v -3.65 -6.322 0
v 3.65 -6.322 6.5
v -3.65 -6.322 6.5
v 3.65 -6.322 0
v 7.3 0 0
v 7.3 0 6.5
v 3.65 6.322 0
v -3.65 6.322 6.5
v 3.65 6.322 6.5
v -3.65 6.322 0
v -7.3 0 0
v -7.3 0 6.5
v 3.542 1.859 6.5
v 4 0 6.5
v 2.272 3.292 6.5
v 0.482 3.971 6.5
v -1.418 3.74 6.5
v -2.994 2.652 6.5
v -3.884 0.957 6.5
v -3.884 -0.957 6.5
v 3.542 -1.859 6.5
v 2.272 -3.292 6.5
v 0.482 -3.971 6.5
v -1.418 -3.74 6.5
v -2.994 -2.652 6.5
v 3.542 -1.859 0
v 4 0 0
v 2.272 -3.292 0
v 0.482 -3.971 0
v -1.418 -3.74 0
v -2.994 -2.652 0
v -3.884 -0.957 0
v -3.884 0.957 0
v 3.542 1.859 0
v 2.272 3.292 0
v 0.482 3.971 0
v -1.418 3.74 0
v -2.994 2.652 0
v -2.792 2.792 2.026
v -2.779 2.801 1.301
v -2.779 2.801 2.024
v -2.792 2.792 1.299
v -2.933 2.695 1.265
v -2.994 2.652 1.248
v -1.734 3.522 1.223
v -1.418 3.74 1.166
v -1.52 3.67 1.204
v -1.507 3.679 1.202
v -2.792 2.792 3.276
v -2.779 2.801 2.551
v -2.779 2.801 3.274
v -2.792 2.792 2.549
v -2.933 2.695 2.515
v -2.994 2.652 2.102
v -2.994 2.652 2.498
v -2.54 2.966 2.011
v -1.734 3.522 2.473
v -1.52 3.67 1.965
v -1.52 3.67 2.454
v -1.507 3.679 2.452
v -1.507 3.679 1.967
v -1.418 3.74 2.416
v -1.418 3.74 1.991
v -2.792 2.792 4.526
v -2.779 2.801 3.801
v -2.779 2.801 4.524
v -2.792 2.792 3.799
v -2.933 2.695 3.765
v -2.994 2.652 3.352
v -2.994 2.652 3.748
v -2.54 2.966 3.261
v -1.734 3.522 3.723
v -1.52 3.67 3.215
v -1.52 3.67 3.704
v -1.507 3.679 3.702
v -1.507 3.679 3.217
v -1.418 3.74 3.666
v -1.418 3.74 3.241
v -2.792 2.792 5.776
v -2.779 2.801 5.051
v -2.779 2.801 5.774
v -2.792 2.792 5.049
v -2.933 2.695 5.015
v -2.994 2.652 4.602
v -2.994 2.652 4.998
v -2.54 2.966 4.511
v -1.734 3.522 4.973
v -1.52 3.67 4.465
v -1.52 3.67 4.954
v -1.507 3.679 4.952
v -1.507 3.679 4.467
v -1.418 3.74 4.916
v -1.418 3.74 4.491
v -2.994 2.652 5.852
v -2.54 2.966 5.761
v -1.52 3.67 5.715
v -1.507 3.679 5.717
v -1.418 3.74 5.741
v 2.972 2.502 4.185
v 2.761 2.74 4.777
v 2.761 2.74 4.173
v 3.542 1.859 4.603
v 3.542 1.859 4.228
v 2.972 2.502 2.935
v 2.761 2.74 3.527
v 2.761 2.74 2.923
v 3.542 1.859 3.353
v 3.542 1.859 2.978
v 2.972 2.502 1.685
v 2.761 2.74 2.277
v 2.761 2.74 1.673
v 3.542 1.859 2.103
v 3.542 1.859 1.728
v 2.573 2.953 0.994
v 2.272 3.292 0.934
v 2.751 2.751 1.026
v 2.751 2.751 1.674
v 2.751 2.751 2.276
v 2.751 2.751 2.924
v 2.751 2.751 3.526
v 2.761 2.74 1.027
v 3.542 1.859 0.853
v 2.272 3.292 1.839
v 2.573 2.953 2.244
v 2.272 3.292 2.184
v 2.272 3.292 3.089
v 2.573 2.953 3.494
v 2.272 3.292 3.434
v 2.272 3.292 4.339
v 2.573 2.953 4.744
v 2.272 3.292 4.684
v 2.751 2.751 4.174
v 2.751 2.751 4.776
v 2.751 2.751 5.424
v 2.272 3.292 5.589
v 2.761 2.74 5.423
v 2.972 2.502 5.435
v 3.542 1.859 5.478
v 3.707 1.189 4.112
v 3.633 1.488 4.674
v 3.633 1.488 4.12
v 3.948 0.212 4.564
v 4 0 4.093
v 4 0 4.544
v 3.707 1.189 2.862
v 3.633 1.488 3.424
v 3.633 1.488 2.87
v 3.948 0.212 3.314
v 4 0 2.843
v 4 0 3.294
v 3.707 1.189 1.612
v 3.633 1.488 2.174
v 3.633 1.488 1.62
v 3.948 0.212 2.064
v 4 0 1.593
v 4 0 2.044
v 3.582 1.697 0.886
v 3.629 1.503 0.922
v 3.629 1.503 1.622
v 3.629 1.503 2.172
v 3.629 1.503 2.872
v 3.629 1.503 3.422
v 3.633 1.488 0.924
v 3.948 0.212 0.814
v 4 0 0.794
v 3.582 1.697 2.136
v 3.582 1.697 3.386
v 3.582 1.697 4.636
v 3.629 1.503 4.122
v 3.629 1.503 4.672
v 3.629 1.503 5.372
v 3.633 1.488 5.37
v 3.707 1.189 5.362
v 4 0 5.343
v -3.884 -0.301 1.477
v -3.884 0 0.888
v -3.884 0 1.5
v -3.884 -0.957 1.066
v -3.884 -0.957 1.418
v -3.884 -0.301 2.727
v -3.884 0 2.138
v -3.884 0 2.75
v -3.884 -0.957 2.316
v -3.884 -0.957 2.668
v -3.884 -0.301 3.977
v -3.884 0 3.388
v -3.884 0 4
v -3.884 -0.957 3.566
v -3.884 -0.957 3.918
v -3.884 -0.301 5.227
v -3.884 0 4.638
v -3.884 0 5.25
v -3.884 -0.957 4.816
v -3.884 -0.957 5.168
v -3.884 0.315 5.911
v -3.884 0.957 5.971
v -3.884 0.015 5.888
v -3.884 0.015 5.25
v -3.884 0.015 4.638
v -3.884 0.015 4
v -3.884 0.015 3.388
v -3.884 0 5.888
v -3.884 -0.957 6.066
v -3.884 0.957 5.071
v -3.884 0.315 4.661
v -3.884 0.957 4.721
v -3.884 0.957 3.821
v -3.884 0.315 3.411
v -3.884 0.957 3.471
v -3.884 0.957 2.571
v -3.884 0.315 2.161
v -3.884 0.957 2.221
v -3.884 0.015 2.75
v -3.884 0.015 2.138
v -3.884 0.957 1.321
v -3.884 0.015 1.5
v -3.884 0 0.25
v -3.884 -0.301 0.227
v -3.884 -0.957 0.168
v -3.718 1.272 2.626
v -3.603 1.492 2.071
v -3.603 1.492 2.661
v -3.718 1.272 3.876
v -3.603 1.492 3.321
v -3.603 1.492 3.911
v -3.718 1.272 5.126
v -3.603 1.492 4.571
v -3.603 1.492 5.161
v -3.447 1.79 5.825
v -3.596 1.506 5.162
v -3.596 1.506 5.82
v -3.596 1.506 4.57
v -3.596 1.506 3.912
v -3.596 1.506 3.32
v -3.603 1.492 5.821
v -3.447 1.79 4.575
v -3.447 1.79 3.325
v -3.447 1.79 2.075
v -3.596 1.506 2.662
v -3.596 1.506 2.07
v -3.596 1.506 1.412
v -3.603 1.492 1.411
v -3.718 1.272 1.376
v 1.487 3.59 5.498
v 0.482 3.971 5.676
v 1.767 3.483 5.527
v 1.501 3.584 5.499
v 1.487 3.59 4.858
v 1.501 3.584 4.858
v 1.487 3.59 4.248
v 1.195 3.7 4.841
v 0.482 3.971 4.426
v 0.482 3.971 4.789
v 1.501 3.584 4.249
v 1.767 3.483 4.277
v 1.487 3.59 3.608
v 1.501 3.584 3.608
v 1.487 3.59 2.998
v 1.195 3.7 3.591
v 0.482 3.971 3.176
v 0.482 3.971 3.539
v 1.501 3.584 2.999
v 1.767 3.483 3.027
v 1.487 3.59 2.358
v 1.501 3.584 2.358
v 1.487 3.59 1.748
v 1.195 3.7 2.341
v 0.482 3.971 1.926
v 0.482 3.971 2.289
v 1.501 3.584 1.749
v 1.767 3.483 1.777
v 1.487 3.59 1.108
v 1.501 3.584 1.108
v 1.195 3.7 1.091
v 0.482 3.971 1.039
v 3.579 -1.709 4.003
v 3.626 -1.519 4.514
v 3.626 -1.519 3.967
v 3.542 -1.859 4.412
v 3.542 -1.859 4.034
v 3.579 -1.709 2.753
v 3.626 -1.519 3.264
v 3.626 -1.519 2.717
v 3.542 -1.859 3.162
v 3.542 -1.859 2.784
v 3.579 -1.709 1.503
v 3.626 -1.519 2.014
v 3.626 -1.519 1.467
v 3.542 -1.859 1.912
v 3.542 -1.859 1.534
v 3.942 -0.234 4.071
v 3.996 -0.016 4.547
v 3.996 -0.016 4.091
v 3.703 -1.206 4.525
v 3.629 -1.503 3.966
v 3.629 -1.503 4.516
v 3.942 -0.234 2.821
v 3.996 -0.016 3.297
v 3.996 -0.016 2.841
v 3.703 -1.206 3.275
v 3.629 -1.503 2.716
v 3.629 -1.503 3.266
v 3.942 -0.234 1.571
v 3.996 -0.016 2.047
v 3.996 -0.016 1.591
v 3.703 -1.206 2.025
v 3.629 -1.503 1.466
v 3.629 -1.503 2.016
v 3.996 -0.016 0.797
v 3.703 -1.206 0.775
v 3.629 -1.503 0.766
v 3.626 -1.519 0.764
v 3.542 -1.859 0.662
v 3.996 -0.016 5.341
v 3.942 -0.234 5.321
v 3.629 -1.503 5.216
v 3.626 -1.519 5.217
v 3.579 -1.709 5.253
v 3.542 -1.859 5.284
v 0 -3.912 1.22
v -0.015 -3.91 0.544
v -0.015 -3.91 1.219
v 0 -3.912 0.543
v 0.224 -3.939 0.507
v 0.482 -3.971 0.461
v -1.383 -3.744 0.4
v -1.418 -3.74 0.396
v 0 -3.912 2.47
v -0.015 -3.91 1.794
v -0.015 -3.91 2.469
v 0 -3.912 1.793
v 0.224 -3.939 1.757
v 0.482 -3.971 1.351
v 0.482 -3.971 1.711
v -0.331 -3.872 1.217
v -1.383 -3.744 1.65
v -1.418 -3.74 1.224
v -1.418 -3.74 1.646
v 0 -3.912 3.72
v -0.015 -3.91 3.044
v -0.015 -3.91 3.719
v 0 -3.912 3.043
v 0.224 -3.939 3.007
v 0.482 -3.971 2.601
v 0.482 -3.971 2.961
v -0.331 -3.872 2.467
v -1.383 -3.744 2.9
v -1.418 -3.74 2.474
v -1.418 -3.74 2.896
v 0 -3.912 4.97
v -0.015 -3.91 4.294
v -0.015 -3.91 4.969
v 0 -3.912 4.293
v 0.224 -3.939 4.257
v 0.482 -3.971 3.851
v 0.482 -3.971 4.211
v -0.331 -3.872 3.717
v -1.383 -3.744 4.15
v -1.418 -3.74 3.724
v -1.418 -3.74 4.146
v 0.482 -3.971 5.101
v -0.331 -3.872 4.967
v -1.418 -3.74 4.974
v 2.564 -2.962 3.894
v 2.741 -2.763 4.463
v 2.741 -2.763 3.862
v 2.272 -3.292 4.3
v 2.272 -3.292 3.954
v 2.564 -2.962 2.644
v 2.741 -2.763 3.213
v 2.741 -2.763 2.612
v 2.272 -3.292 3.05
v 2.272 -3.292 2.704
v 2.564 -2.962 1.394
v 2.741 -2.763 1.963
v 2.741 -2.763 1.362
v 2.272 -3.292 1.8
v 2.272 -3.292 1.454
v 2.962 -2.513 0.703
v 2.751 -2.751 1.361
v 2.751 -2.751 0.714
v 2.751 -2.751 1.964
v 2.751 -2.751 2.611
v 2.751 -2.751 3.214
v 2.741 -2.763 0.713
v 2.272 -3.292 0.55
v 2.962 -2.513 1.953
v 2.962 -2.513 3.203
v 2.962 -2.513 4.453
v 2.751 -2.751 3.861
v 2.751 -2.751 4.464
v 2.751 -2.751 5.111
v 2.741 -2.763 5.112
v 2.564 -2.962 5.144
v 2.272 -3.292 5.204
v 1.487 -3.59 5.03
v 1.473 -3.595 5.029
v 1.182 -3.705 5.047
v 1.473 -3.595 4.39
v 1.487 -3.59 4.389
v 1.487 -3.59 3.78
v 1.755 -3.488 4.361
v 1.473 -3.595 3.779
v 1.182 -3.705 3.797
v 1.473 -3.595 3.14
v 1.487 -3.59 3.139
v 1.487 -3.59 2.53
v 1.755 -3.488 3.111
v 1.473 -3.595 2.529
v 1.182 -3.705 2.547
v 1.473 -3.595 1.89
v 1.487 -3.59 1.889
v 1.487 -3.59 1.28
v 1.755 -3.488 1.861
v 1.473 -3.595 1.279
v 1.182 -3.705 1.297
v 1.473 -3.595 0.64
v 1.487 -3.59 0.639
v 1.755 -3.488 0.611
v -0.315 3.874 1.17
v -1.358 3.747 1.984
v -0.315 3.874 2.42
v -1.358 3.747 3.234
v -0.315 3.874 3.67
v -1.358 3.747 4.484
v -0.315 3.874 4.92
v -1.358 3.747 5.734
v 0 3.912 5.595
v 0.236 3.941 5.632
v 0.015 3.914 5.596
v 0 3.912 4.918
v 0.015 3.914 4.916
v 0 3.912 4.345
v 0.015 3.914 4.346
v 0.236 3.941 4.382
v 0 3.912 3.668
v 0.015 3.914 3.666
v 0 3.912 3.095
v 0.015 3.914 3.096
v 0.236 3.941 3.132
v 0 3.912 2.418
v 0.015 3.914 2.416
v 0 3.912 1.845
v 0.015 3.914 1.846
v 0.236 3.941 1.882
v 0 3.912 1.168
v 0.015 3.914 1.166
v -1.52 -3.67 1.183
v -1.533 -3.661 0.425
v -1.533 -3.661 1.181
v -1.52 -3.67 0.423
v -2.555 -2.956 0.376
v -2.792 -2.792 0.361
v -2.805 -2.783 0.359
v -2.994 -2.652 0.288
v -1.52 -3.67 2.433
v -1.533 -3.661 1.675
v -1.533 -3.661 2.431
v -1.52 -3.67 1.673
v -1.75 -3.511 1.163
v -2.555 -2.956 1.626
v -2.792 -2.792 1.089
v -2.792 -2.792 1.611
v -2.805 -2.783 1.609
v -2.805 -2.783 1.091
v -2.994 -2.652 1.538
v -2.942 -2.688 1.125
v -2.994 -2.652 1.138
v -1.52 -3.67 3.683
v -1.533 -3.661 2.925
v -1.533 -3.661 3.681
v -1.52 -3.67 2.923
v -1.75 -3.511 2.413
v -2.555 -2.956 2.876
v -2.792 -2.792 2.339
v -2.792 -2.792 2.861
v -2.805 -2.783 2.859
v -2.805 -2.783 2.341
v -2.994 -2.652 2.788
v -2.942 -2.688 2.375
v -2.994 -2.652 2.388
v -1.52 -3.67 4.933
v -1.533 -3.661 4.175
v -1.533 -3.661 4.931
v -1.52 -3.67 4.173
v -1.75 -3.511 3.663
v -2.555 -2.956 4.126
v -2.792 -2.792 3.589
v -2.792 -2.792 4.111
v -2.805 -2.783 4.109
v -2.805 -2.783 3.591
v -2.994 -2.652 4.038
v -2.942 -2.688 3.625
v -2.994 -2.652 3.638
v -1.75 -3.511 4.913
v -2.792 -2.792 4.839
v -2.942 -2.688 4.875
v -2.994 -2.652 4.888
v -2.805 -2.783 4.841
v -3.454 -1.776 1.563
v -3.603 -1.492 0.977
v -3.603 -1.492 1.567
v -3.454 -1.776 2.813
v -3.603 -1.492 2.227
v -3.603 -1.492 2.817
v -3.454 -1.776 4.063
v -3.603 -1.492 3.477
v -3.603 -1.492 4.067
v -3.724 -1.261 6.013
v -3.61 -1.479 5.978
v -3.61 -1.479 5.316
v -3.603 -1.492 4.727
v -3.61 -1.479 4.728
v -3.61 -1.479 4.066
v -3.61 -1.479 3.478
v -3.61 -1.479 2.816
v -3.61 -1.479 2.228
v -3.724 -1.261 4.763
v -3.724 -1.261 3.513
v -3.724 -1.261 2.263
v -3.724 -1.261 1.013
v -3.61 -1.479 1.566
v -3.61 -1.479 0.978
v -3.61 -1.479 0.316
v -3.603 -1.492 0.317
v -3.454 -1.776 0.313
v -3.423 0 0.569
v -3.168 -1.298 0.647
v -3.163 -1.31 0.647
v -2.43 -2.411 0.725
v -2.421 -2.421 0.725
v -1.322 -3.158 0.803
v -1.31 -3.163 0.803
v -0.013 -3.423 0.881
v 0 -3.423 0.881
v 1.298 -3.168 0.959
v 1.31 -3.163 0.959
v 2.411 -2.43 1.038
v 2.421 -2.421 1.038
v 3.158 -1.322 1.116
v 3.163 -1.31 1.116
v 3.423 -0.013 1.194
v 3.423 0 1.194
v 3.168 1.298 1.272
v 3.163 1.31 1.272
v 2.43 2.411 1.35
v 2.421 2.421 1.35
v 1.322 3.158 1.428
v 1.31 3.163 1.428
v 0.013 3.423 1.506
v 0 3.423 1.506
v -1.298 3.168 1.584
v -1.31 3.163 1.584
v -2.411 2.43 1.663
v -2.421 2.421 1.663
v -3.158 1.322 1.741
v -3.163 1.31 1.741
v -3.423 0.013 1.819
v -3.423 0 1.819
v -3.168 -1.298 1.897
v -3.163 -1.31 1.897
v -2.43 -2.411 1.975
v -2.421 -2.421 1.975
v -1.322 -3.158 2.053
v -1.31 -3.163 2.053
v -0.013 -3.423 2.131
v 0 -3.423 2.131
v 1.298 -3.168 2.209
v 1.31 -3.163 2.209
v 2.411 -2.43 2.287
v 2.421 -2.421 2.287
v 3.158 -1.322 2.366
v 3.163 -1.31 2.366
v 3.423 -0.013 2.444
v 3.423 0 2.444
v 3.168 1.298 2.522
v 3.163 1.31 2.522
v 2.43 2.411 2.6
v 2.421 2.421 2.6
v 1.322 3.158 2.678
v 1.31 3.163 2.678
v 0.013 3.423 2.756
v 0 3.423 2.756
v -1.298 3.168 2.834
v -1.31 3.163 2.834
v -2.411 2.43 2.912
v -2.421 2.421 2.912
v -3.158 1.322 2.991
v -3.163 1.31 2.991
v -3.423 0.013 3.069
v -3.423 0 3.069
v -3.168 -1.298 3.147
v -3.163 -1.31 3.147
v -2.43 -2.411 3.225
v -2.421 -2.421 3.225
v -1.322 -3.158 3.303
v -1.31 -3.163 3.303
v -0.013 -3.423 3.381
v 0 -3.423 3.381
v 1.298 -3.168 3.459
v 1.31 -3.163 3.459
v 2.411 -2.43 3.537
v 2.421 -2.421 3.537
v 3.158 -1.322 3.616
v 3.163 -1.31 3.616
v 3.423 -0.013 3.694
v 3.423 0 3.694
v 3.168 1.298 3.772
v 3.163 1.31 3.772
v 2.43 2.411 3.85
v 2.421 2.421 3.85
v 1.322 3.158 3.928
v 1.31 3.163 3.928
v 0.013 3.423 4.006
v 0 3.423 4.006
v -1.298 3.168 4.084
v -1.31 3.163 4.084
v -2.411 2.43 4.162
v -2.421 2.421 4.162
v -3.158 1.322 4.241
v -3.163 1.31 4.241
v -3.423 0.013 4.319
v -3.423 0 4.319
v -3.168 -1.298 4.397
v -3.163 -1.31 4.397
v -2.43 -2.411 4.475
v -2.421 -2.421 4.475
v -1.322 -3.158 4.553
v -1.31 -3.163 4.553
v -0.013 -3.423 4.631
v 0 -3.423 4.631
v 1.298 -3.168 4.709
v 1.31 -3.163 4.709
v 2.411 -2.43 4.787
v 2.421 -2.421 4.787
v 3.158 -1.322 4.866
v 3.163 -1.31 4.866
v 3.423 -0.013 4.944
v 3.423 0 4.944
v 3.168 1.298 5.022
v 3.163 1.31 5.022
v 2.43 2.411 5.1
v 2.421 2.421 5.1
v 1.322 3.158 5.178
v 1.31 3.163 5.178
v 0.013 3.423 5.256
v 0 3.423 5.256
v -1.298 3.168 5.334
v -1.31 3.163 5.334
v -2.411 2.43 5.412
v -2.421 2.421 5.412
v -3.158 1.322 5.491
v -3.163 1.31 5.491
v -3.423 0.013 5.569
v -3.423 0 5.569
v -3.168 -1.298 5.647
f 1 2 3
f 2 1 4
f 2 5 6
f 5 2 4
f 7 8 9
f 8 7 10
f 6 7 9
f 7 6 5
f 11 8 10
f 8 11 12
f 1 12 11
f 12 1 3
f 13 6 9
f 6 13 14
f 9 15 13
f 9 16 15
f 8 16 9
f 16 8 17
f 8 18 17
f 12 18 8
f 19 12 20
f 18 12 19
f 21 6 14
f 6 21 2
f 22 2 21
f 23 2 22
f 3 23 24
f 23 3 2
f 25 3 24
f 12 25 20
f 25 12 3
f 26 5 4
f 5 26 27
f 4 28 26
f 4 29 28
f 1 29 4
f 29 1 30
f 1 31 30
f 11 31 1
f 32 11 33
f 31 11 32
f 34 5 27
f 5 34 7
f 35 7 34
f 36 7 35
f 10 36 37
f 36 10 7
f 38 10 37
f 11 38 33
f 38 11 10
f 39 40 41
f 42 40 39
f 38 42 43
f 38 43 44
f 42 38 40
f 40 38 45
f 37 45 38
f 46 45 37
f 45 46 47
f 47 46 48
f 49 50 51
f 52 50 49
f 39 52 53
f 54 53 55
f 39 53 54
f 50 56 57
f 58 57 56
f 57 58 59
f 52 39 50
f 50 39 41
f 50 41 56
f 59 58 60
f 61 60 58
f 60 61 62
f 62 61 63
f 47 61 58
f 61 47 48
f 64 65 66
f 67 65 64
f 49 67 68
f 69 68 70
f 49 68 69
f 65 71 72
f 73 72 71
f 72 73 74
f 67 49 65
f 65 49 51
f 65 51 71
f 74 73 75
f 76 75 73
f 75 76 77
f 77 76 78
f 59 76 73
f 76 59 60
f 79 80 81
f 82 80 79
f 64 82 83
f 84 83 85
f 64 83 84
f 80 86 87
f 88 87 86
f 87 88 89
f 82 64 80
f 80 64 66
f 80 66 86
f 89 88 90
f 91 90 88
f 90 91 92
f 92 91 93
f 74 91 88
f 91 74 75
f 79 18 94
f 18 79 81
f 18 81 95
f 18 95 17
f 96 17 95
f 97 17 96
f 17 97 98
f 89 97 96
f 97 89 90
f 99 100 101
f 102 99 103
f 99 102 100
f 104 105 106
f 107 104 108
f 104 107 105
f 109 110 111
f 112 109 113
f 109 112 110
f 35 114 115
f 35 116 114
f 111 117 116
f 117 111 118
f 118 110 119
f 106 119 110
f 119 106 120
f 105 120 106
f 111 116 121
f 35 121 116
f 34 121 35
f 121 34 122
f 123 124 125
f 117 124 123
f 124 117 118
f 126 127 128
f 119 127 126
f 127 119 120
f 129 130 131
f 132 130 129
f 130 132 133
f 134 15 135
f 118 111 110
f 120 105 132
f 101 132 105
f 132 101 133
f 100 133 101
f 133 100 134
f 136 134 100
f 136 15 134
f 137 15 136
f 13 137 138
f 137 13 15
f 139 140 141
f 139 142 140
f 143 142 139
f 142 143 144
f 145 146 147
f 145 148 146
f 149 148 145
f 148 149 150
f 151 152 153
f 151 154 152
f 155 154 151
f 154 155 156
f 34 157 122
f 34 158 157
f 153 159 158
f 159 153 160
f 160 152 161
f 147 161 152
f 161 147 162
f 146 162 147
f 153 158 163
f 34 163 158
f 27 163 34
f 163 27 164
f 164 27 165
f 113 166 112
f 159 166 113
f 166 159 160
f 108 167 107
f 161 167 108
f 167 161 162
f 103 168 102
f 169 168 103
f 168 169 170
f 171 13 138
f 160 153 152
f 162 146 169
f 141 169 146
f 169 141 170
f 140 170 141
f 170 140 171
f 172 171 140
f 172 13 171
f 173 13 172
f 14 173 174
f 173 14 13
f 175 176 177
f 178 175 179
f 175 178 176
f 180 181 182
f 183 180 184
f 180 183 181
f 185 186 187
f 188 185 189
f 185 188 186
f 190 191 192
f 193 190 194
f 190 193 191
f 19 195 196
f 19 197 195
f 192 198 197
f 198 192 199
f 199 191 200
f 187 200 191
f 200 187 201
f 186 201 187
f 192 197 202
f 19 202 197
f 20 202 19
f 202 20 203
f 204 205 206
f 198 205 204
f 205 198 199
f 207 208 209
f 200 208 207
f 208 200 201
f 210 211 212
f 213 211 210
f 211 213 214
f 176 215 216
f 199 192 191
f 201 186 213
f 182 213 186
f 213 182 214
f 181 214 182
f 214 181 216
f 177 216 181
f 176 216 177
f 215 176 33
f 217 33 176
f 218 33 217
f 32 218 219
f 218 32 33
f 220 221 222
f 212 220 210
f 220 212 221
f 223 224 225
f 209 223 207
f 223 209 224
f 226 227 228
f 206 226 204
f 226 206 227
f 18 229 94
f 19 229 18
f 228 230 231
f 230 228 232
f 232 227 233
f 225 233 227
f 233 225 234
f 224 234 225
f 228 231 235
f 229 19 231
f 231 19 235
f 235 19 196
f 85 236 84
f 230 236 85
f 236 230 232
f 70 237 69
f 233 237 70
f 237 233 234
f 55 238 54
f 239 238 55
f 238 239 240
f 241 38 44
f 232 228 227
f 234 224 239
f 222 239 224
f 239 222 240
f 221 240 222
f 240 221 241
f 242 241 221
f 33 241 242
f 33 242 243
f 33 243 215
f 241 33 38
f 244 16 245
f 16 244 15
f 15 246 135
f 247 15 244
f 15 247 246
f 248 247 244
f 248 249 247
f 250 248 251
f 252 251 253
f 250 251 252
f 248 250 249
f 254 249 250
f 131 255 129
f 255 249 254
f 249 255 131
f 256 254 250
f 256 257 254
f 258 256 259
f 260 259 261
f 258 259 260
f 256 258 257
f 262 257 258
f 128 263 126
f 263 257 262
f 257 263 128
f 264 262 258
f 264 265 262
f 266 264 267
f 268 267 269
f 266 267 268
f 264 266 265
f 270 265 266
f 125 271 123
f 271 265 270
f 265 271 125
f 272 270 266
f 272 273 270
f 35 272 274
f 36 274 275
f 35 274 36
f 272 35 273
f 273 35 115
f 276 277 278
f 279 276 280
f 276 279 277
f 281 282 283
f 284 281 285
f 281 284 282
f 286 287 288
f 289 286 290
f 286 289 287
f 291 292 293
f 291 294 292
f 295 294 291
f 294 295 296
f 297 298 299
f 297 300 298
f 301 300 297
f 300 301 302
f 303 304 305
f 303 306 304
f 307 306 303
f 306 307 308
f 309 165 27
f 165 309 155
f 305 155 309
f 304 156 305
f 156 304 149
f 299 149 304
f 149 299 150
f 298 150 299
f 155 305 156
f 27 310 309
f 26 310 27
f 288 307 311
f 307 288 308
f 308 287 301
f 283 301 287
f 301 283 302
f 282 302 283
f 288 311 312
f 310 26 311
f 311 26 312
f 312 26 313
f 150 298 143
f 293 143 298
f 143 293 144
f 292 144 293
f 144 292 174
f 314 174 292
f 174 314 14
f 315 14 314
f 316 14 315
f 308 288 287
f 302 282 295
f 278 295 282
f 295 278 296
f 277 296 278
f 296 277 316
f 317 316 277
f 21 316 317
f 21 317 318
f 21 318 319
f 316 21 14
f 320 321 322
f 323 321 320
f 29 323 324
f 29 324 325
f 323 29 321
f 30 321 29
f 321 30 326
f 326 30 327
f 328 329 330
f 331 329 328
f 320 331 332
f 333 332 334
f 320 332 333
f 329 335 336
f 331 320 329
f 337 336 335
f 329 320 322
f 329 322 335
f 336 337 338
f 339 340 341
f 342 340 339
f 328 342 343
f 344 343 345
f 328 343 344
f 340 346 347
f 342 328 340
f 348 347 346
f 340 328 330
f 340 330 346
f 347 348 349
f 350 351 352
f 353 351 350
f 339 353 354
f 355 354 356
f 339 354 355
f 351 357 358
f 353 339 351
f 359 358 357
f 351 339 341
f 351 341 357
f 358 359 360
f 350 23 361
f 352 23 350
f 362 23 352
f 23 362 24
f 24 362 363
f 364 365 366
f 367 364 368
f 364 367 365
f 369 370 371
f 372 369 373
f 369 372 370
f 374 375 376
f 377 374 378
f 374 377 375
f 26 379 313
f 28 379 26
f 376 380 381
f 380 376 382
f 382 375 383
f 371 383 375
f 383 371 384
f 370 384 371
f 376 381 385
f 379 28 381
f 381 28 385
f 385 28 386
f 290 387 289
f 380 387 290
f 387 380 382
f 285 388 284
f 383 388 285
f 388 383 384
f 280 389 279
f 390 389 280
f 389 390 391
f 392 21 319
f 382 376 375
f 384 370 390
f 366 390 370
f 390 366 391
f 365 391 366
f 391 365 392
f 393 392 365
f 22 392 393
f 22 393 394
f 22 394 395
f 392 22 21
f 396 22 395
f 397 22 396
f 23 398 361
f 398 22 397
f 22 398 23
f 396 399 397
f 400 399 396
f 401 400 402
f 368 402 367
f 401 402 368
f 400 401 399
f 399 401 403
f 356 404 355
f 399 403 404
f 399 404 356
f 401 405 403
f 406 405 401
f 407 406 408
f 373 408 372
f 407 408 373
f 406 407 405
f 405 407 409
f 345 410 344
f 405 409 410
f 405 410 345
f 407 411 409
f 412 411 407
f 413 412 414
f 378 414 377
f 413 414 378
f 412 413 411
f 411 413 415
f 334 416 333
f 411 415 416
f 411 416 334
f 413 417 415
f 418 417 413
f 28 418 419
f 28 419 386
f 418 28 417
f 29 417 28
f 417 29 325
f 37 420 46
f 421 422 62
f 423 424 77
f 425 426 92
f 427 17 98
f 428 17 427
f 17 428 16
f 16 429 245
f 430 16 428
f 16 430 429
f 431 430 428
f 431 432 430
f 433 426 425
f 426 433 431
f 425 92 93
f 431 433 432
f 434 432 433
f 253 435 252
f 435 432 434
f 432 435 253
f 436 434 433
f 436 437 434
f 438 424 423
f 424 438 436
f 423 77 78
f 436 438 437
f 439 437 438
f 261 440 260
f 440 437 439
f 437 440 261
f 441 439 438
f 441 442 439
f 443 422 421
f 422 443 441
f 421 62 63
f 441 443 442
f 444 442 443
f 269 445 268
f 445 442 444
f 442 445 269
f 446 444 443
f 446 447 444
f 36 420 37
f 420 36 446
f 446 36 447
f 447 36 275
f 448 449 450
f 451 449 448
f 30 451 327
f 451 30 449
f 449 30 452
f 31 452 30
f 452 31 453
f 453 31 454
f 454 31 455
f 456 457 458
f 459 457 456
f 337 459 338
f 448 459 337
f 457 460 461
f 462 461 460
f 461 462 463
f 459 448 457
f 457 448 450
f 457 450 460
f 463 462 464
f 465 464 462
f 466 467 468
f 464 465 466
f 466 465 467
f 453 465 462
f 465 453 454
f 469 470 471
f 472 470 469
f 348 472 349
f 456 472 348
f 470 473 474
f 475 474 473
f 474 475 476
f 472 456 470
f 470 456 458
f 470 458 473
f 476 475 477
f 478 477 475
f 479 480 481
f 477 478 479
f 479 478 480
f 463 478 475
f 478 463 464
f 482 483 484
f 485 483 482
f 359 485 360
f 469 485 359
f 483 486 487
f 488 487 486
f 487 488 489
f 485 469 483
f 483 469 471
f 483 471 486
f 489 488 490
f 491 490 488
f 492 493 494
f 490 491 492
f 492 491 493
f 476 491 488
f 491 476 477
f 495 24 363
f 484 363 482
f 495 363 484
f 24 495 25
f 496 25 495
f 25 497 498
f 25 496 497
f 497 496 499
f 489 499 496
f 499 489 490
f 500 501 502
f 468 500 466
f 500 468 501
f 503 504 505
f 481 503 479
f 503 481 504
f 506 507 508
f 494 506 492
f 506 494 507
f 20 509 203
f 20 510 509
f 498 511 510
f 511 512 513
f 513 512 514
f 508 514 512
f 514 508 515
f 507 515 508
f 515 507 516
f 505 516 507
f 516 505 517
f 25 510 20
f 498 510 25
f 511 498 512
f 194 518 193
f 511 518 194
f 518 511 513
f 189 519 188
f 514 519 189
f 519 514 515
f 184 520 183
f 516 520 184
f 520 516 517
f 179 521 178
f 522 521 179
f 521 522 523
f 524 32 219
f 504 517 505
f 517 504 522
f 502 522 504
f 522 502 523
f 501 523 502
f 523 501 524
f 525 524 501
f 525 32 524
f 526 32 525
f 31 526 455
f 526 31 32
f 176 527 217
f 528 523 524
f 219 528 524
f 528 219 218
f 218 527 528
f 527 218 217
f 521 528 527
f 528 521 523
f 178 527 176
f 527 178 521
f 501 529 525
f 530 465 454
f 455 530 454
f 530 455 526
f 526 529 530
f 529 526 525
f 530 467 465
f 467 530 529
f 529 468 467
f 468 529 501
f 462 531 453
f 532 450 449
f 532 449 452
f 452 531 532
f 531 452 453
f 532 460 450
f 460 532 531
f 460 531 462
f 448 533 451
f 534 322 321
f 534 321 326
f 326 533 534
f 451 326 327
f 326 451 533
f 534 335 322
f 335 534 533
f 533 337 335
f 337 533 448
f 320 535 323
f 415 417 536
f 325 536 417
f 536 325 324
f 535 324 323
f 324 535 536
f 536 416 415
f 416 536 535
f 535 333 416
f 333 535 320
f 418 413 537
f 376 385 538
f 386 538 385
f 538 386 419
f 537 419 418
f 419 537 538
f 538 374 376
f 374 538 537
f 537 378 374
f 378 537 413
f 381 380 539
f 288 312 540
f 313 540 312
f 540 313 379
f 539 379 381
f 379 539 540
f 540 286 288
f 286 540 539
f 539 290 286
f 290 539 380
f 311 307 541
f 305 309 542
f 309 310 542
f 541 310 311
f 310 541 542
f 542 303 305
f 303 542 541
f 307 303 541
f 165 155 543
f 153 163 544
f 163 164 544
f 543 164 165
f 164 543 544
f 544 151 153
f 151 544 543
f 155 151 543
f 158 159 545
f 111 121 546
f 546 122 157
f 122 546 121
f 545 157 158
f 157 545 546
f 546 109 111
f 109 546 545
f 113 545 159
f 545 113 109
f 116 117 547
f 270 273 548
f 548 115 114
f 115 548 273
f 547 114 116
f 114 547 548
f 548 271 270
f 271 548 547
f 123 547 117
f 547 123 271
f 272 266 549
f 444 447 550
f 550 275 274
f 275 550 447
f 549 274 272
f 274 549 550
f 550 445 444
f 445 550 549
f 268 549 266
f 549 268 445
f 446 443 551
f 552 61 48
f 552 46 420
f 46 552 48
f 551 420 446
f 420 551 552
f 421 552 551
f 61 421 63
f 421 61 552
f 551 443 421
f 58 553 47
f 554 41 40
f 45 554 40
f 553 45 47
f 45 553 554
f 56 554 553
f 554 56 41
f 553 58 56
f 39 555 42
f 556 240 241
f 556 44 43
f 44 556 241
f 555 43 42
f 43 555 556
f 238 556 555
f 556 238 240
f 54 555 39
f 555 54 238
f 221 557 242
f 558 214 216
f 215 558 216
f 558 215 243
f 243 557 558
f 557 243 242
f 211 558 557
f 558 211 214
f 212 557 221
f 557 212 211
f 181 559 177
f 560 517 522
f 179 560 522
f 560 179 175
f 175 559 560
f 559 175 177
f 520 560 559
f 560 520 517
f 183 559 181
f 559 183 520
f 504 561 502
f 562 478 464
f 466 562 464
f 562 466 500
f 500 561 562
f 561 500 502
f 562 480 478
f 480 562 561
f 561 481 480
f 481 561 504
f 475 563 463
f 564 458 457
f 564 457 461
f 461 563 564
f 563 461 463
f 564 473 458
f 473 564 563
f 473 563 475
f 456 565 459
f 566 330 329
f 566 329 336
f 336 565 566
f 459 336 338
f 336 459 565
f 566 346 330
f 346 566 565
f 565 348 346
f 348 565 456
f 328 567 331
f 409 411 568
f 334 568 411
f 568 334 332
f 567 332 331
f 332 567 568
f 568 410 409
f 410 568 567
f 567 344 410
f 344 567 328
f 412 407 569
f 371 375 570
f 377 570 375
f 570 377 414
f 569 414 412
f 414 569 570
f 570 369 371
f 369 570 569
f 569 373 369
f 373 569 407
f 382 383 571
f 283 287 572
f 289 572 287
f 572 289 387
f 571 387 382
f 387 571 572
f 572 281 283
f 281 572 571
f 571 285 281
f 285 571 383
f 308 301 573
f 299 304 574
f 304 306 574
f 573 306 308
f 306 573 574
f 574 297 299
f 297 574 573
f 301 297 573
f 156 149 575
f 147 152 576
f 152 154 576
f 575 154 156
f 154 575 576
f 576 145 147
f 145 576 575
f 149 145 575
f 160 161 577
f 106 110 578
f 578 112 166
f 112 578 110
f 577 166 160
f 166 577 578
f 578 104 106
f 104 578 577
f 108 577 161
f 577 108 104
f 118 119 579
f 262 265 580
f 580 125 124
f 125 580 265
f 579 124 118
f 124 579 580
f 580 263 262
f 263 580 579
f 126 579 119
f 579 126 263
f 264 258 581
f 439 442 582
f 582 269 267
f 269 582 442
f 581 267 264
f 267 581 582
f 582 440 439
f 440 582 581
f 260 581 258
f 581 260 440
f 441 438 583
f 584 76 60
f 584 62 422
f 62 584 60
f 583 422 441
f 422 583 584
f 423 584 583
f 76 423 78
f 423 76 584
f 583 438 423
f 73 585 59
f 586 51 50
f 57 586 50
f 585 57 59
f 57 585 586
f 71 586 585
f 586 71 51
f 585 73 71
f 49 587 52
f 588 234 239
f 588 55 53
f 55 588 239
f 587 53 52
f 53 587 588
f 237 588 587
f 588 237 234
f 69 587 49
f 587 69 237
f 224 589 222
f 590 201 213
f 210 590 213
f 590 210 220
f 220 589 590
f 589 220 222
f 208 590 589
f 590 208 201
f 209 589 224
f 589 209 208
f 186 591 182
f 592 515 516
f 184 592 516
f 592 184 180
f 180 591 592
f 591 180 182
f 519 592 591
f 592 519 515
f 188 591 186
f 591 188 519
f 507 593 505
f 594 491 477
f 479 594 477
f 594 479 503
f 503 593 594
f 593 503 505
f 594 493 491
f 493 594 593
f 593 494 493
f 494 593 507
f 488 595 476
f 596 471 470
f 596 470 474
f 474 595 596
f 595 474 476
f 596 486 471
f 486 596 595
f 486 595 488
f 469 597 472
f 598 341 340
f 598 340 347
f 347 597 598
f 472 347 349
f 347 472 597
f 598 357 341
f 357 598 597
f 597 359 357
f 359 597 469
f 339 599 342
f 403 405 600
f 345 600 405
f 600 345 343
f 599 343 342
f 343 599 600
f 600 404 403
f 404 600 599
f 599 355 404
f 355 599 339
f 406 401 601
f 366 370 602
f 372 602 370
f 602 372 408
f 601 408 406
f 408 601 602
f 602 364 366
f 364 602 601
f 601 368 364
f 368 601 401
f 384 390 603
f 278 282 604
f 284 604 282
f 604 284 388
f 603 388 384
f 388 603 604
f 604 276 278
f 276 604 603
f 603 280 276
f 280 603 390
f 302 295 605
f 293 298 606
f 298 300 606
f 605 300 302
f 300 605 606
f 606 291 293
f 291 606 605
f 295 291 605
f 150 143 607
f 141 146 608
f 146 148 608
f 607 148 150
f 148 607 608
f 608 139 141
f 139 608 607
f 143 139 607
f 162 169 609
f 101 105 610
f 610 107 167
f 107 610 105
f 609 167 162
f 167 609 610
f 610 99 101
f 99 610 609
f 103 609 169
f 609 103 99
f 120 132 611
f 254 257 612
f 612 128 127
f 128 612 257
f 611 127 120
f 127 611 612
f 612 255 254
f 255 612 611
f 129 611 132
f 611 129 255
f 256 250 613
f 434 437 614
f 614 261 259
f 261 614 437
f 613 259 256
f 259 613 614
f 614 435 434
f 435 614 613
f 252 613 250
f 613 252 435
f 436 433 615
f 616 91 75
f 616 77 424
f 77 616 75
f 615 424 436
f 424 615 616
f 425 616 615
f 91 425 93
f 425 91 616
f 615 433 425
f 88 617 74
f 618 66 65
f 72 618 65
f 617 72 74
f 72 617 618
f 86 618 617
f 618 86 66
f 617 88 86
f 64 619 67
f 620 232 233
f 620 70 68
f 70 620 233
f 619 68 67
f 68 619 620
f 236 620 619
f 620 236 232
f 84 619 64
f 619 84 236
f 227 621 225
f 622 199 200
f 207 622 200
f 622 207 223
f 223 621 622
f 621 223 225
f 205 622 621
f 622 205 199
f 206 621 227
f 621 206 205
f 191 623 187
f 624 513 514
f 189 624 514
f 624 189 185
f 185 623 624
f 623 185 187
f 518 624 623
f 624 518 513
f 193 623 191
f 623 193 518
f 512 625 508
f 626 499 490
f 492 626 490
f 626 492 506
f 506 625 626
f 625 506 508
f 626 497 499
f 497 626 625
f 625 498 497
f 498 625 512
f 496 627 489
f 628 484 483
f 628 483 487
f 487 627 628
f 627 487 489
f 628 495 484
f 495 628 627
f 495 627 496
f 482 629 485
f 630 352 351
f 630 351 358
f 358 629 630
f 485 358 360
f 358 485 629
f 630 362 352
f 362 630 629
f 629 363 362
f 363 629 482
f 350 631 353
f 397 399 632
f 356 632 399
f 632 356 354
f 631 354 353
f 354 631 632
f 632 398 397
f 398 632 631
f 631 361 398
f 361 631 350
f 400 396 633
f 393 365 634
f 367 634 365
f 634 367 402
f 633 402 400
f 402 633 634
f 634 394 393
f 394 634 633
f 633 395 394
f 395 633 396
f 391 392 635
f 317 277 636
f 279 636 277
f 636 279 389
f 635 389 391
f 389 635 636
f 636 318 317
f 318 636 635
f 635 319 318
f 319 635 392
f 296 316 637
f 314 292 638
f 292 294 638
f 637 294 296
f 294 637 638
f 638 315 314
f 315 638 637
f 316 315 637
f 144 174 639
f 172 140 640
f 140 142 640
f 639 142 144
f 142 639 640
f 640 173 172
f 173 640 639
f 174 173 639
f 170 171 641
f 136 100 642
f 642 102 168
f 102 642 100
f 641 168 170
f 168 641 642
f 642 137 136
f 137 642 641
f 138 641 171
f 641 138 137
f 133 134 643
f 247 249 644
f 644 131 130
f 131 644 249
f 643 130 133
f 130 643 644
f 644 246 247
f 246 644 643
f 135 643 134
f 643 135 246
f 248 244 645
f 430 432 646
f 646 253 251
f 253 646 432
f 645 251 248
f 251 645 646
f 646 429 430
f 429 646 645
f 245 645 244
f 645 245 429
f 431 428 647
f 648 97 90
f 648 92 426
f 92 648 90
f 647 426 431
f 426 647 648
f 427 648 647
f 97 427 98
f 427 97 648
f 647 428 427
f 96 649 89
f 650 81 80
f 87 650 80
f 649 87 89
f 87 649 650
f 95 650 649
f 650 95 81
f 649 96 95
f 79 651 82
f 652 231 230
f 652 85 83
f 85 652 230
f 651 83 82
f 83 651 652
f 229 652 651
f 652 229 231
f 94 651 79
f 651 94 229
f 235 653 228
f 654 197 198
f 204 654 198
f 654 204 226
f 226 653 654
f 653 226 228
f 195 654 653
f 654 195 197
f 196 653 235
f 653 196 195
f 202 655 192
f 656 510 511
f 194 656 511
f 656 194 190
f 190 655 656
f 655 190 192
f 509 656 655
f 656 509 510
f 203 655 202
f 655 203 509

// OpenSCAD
// file: ISOThread.scad
// ISO Metric Thread Implementation
// Trevor Moseley
// 15/07/2012

// For thread dimensions see
//   http://en.wikipedia.org/wiki/File:ISO_and_UTS_Thread_Dimensions.svg

//$fn = 32;
//hex_bolt(10,16);
//hex_nut(10);
//thread_out(8,16);
//hex_bolt(8,16);
//hex_nut(8);
//hex_bolt(6,12);
//hex_nut(6);

// function for thread pitch
function get_coarse_pitch(dia) = lookup(dia, [
[1,0.25],[1.2,0.25],[1.4,0.3],[1.6,0.35],[1.8,0.35],[2,0.4],[2.5,0.45],[3,0.5],[3.5,0.6],[4,0.7],[5,0.8],[6,1],[7,1],[8,1.25],[10,1.5],[12,1.75],[14,2],[16,2],[18,2.5],[20,2.5],[22,2.5],[24,3],[27,3],[30,3.5],[33,3.5],[36,4],[39,4],[42,4.5],[45,4.5],[48,5],[52,5],[56,5.5],[60,5.5],[64,6],[78,5]]);

// function for hex nut diameter from thread size
function hex_nut_dia(dia) = lookup(dia, [
[3,6.4],[4,8.1],[5,9.2],[6,11.5],[8,14.60],[10,19.6],[12,22.1],[16,27.7],[20,34.6],[24,41.6],[30,53.1],[36,63.5]]);

// function for hex nut height from thread size
function hex_nut_hi(dia) = lookup(dia, [
[3,2.4],[4,3.2],[5,4],[6,3],[8,6.5],[10,5],[12,10],[16,13],[20,16],[24,19],[30,24],[36,29]]);


// function for hex bolt head diameter from thread size
function hex_bolt_dia(dia) = lookup(dia, [
[3,6.4],[4,8.1],[5,9.2],[6,11.5],[8,14.0],[10,16],[12,22.1],[16,27.7],[20,34.6],[24,41.6],[30,53.1],[36,63.5]]);
// function for hex bolt head height from thread size
function hex_bolt_hi(dia) = lookup(dia, [
[3,2.4],[4,3.2],[5,4],[6,3.5],[8,4.5],[10,5],[12,10],[16,13],[20,16],[24,19],[30,24],[36,29]]);

module thread_out(dia,hi,thr=32)
{
	p = get_coarse_pitch(dia);
	h = (cos(30)*p)/8;
	Rmin = (dia/2) - (5*h);	// as wiki Dmin
	s = 360/thr;
	t = (hi-p)/p;			// number of turns
	n = t*thr;				// number of segments
	//echo(str("dia=",dia," hi=",hi," p=",p," h=",h," Rmin=",Rmin," s=",s));
	cylinder(r = Rmin, h = hi);
	for(sg=[0:n])
		th_out_pt(Rmin+0.1,p,s,sg,thr,h,(hi-p)/n);
}

module th_out_pt(rt,p,s,sg,thr,h,sh)
// rt = radius of thread (nearest centre)
// p = pitch
// s = segment length (degrees)
// sg = segment number
// thr = segments in circumference
// h = ISO h of thread / 8
// sh = segment height (z)
{
//	as = 360-((sg % thr) * s);	// angle to start of seg
//	ae = as - s  + (s/100);		// angle to end of seg (with overlap)
	as = (sg % thr) * s;			// angle to start of seg
	ae = as + s  - (s/100);		// angle to end of seg (with overlap)
	z = sh*sg;
	//pp = p/2;
	//   1,4
	//   |\
	//   |  \  2,5
 	//   |  / 
	//   |/
	//   0,3
	//  view from front (x & z) extruded in y by sg
	//  
	//echo(str("as=",as,", ae=",ae," z=",z));
	polyhedron(
		points = [
			[cos(as)*rt,sin(as)*rt,z],								// 0
			[cos(as)*rt,sin(as)*rt,z+(3/4*p)],						// 1
			[cos(as)*(rt+(5*h)),sin(as)*(rt+(5*h)),z+(3/8*p)],		// 2
			[cos(ae)*rt,sin(ae)*rt,z+sh],							// 3
			[cos(ae)*rt,sin(ae)*rt,z+(3/4*p)+sh],					// 4
			[cos(ae)*(rt+(5*h)),sin(ae)*(rt+(5*h)),z+sh+(3/8*p)]],	// 5
		triangles = [
			[0,1,2],			// near face
			[3,5,4],			// far face
			[0,3,4],[0,4,1],	// left face
			[0,5,3],[0,2,5],	// bottom face
			[1,4,5],[1,5,2]]);	// top face
}

module thread_in(dia,hi,thr=16)
{
	p = get_coarse_pitch(dia);
	h = (cos(30)*p)/8;
	Rmin = (dia/2) - (5*h);	// as wiki Dmin
	s = 360/thr;
	t = (hi-p)/p;			// number of turns
	n = t*thr;				// number of segments
	echo(str("dia=",dia," hi=",hi," p=",p," h=",h," Rmin=",Rmin," s=",s));
	difference()
	{
		cylinder(r = (dia/2)+0.5,h = hi);
		translate([0,0,-1]) cylinder(r = (dia/2)+0.1, h = hi+2);
	}
	for(sg=[0:n])
		th_in_pt(Rmin+0.1,p,s,sg,thr,h,(hi-p)/n);
}

module th_in_pt(rt,p,s,sg,thr,h,sh)
// rt = radius of thread (nearest centre)
// p = pitch
// s = segment length (degrees)
// sg = segment number
// thr = segments in circumference
// h = ISO h of thread / 8
// sh = segment height (z)
{
//	as = 360 - (((sg % thr) * s) - 180);	// angle to start of seg
//	ae = as - s + (s/100);		// angle to end of seg (with overlap)
	as = ((sg % thr) * s - 180);	// angle to start of seg
	ae = as + s -(s/100);		// angle to end of seg (with overlap)
	z = sh*sg;
	pp = p/2;
	//         2,5
	//          /|
	//  1,4 /  | 
 	//        \  |
	//          \|
	//         0,3
	//  view from front (x & z) extruded in y by sg
	//  
	polyhedron(
		points = [
			[cos(as)*(rt+(5*h)),sin(as)*(rt+(5*h)),z],				//0
			[cos(as)*rt,sin(as)*rt,z+(3/8*p)],						//1
			[cos(as)*(rt+(5*h)),sin(as)*(rt+(5*h)),z+(3/4*p)],		//2
			[cos(ae)*(rt+(5*h)),sin(ae)*(rt+(5*h)),z+sh],			//3
			[cos(ae)*rt,sin(ae)*rt,z+(3/8*p)+sh],					//4
			[cos(ae)*(rt+(5*h)),sin(ae)*(rt+(5*h)),z+(3/4*p)+sh]],	//5
		triangles = [
			[0,1,2],			// near face
			[3,5,4],			// far face
			[0,3,4],[0,4,1],	// left face
			[0,5,3],[0,2,5],	// bottom face
			[1,4,5],[1,5,2]]);	// top face
}

module hex_nut(dia)
{
	hi = hex_nut_hi(dia);
	difference()
	{
	  cylinder(r = hex_nut_dia(dia)/2,h = hi, $fn=6);
        translate([0,0,-0.1])	cylinder(r = dia/2, h =hi + 0.2);
	}
	translate([0,0,0.1])	thread_in(dia,hi-0.2);
}

module hex_bolt(dia,hi)
{
	hhi = hex_bolt_hi(dia);
	cylinder(r = hex_bolt_dia(dia)/2,h = hhi, $fn=6);
	translate([0,0,hhi-0.1])	thread_out(dia,hi+0.1);
}
// main file
//------------------------------------------------------------------------------------------------
//  Printable M8 hex nut
//----------------------------------------------------------------------------------------------
// (c) Juan Gonzalez-Gomez (Obijuan), July-2012
// Based on the wonderful ISO Metric Thread by Trevor Moseley
//---------------------------------------------------------------------------------------------
//-- GPL License
//----------------------------------------------------------------------------------------------
use <ISOThread.scad>

//-------------------------------------------------------------------------------------------------
//-- Parameterized ISO M8 Nut
//-- dia:  Hex nut outer diam
//-- hi:  Hex nut height
//-- When no parameters are give, standar dimension are used
//-------------------------------------------------------------------------------------------------
module hex_nut_M8(dia=14.6, hi=6.5)
{
	difference() {
	  cylinder(r = dia/2,h = hi, $fn=6);
        translate([0,0,-0.1])	cylinder(r = 8/2, h =hi + 0.2);
	}
	translate([0,0,0.1])	thread_in(8,hi-0.2);
}


//-------------------
//-- Examples:
//--------------------

//-- Standard nut
hex_nut_M8();

//-- Doble height hex_nut
//hex_nut_M8(hi=13);

//-- Wider hex nut
//hex_nut_M8(dia=20);
